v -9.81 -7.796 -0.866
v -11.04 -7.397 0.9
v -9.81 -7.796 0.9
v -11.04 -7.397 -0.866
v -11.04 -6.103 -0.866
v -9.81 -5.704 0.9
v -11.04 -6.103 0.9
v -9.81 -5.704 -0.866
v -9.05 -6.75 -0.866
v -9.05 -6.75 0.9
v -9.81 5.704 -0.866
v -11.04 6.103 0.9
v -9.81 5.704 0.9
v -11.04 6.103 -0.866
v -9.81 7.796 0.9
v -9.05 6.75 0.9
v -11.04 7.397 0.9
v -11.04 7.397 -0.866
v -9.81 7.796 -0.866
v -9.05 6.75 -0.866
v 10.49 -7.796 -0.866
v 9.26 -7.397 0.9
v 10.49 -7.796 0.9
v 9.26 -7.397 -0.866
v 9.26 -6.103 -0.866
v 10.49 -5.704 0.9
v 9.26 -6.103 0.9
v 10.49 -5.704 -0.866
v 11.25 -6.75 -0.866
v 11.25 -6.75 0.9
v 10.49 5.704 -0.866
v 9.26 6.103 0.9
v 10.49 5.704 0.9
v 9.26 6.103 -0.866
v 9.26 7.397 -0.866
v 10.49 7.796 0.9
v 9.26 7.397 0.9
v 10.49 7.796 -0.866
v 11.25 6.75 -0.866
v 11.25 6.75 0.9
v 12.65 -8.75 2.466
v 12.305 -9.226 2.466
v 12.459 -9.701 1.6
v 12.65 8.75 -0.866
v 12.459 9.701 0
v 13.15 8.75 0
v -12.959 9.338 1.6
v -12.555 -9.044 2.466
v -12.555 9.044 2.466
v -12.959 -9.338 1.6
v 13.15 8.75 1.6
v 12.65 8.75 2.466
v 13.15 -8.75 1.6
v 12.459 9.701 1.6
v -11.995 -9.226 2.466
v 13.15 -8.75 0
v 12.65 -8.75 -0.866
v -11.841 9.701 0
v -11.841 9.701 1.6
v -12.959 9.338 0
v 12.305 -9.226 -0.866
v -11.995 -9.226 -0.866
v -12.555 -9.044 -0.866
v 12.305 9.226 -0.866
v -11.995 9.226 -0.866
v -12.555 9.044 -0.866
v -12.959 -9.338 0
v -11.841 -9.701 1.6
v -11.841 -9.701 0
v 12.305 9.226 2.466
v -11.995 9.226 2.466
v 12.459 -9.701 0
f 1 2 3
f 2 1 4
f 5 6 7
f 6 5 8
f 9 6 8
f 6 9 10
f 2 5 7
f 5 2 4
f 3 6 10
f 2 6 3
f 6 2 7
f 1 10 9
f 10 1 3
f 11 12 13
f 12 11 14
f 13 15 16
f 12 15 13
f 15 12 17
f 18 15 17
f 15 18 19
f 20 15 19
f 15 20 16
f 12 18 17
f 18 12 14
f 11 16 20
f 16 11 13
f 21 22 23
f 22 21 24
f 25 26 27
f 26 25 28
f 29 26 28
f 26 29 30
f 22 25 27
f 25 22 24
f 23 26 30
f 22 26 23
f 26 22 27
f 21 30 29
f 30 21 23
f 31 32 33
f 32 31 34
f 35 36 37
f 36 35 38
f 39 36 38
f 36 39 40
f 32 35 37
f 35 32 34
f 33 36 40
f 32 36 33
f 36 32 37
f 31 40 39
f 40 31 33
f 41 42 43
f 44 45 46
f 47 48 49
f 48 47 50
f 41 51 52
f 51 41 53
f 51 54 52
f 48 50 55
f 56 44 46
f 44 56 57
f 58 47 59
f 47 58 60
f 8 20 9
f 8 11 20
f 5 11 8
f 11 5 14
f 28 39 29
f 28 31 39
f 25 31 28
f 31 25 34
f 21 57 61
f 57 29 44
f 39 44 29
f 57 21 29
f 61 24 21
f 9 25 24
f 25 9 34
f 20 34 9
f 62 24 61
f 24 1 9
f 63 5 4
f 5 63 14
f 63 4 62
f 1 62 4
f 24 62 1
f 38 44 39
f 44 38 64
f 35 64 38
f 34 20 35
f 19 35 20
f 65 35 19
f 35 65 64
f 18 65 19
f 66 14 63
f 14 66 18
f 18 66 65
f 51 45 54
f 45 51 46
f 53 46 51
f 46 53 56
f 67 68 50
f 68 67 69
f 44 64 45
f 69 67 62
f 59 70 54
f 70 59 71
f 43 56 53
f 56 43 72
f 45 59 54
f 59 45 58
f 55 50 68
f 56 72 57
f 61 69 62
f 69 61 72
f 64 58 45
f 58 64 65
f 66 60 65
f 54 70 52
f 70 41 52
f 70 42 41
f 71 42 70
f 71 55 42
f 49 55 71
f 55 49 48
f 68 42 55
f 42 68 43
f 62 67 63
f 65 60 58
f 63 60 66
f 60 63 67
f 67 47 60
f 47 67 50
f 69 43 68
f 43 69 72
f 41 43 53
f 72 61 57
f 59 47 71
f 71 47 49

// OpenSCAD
// Parameters
pcb_L = 26.3; //[13.15:52.6:0.1]
pcb_W = 19.5; //[9.75:39:0.1]
pcb_T = 1.6; //[0.8:3.2:0.1]
corner_R = 1; //[0.5:2:0.1]
rounding_sphere_R = 1; //[0.5:2:0.1]
mount_hole_d = 2.2; //[1.1:4.4:0.1]
mount_hole_edge_margin = 3.0; //[1.5:6:0.1]
hole_clearance_extra = 0.2; //[0.1:0.6:0.05]
outline_line_w = 0.3; //[0.15:0.8:0.05]
outline_raise_h = 0.15; //[0.05:0.4:0.05]
outline_L = 14.0; //[7:28:0.1]
outline_W = 14.0; //[7:28:0.1]
outline_center_x = 0.0; //[-5:5:0.1]
outline_center_y = 2.0; //[-5:5:0.1]
pad_d = 1.6; //[0.8:3.2:0.1]
pad_h = 0.12; //[0.05:0.3:0.01]
header_pitch = 2.54; //[1.27:5.08:0.01]
header_pins = 5; //[3:8:1]
header_center_x = 0.0; //[-5:5:0.1]
header_center_y = -6.0; //[-10:0:0.1]
trace_w = 0.5; //[0.2:1.5:0.05]
trace_h = 0.05; //[0.02:0.2:0.01]
trace_overlap = 0.6; //[0.3:1.5:0.05]
z_fuse_overlap = 0.2; //[0.1:0.6:0.05]

// PCB Core with Rounded Corners
module pcb_core() {
  difference() {
    minkowski() {
      translate([0, 0, pcb_T/2])
        cube([pcb_L - 2*corner_R, pcb_W - 2*corner_R, pcb_T], center=true);
      sphere(r=rounding_sphere_R);
    }
    // Mounting Holes
    for (x = [-1, 1], y = [-1, 1]) {
      translate([x * (pcb_L/2 - mount_hole_edge_margin), y * (pcb_W/2 - mount_hole_edge_margin), 0])
        cylinder(r=mount_hole_d/2, h=pcb_T + hole_clearance_extra, center=true);
    }
  }
}

// Encoder Footprint Outline
module encoder_footprint_outline() {
  union() {
    translate([outline_center_x, outline_center_y + outline_W/2 - outline_line_w/2, pcb_T/2 + outline_raise_h/2 - z_fuse_overlap])
      cube([outline_L, outline_line_w, outline_raise_h], center=true);
    translate([outline_center_x, outline_center_y - outline_W/2 + outline_line_w/2, pcb_T/2 + outline_raise_h/2 - z_fuse_overlap])
      cube([outline_L, outline_line_w, outline_raise_h], center=true);
    translate([outline_center_x - outline_L/2 + outline_line_w/2, outline_center_y, pcb_T/2 + outline_raise_h/2 - z_fuse_overlap])
      cube([outline_line_w, outline_W, outline_raise_h], center=true);
    translate([outline_center_x + outline_L/2 - outline_line_w/2, outline_center_y, pcb_T/2 + outline_raise_h/2 - z_fuse_overlap])
      cube([outline_line_w, outline_W, outline_raise_h], center=true);
  }
}

// Pin Header Pads
module pin_header_pads() {
  for (i = [-2, -1, 0, 1, 2]) {
    translate([header_center_x + i * header_pitch, header_center_y, pcb_T/2 + pad_h/2 - z_fuse_overlap])
      cylinder(r=pad_d/2, h=pad_h, center=true);
  }
}

// Copper Traces
module copper_traces() {
  for (i = [-2, -1, 0, 1, 2]) {
    translate([(outline_center_x + (header_center_x + i * header_pitch))/2, header_center_y, pcb_T/2 + trace_h/2 - z_fuse_overlap])
      cube([abs(outline_center_x - (header_center_x + i * header_pitch)) + trace_overlap + pad_d/2, trace_w, trace_h], center=true);
  }
}

// Complete Model
module complete_model() {
  color([0.0, 0.4, 0.2]) // PCB color
  union() {
    pcb_core();
    encoder_footprint_outline();
    pin_header_pads();
    copper_traces();
  }
}

// Render the complete model
complete_model();
